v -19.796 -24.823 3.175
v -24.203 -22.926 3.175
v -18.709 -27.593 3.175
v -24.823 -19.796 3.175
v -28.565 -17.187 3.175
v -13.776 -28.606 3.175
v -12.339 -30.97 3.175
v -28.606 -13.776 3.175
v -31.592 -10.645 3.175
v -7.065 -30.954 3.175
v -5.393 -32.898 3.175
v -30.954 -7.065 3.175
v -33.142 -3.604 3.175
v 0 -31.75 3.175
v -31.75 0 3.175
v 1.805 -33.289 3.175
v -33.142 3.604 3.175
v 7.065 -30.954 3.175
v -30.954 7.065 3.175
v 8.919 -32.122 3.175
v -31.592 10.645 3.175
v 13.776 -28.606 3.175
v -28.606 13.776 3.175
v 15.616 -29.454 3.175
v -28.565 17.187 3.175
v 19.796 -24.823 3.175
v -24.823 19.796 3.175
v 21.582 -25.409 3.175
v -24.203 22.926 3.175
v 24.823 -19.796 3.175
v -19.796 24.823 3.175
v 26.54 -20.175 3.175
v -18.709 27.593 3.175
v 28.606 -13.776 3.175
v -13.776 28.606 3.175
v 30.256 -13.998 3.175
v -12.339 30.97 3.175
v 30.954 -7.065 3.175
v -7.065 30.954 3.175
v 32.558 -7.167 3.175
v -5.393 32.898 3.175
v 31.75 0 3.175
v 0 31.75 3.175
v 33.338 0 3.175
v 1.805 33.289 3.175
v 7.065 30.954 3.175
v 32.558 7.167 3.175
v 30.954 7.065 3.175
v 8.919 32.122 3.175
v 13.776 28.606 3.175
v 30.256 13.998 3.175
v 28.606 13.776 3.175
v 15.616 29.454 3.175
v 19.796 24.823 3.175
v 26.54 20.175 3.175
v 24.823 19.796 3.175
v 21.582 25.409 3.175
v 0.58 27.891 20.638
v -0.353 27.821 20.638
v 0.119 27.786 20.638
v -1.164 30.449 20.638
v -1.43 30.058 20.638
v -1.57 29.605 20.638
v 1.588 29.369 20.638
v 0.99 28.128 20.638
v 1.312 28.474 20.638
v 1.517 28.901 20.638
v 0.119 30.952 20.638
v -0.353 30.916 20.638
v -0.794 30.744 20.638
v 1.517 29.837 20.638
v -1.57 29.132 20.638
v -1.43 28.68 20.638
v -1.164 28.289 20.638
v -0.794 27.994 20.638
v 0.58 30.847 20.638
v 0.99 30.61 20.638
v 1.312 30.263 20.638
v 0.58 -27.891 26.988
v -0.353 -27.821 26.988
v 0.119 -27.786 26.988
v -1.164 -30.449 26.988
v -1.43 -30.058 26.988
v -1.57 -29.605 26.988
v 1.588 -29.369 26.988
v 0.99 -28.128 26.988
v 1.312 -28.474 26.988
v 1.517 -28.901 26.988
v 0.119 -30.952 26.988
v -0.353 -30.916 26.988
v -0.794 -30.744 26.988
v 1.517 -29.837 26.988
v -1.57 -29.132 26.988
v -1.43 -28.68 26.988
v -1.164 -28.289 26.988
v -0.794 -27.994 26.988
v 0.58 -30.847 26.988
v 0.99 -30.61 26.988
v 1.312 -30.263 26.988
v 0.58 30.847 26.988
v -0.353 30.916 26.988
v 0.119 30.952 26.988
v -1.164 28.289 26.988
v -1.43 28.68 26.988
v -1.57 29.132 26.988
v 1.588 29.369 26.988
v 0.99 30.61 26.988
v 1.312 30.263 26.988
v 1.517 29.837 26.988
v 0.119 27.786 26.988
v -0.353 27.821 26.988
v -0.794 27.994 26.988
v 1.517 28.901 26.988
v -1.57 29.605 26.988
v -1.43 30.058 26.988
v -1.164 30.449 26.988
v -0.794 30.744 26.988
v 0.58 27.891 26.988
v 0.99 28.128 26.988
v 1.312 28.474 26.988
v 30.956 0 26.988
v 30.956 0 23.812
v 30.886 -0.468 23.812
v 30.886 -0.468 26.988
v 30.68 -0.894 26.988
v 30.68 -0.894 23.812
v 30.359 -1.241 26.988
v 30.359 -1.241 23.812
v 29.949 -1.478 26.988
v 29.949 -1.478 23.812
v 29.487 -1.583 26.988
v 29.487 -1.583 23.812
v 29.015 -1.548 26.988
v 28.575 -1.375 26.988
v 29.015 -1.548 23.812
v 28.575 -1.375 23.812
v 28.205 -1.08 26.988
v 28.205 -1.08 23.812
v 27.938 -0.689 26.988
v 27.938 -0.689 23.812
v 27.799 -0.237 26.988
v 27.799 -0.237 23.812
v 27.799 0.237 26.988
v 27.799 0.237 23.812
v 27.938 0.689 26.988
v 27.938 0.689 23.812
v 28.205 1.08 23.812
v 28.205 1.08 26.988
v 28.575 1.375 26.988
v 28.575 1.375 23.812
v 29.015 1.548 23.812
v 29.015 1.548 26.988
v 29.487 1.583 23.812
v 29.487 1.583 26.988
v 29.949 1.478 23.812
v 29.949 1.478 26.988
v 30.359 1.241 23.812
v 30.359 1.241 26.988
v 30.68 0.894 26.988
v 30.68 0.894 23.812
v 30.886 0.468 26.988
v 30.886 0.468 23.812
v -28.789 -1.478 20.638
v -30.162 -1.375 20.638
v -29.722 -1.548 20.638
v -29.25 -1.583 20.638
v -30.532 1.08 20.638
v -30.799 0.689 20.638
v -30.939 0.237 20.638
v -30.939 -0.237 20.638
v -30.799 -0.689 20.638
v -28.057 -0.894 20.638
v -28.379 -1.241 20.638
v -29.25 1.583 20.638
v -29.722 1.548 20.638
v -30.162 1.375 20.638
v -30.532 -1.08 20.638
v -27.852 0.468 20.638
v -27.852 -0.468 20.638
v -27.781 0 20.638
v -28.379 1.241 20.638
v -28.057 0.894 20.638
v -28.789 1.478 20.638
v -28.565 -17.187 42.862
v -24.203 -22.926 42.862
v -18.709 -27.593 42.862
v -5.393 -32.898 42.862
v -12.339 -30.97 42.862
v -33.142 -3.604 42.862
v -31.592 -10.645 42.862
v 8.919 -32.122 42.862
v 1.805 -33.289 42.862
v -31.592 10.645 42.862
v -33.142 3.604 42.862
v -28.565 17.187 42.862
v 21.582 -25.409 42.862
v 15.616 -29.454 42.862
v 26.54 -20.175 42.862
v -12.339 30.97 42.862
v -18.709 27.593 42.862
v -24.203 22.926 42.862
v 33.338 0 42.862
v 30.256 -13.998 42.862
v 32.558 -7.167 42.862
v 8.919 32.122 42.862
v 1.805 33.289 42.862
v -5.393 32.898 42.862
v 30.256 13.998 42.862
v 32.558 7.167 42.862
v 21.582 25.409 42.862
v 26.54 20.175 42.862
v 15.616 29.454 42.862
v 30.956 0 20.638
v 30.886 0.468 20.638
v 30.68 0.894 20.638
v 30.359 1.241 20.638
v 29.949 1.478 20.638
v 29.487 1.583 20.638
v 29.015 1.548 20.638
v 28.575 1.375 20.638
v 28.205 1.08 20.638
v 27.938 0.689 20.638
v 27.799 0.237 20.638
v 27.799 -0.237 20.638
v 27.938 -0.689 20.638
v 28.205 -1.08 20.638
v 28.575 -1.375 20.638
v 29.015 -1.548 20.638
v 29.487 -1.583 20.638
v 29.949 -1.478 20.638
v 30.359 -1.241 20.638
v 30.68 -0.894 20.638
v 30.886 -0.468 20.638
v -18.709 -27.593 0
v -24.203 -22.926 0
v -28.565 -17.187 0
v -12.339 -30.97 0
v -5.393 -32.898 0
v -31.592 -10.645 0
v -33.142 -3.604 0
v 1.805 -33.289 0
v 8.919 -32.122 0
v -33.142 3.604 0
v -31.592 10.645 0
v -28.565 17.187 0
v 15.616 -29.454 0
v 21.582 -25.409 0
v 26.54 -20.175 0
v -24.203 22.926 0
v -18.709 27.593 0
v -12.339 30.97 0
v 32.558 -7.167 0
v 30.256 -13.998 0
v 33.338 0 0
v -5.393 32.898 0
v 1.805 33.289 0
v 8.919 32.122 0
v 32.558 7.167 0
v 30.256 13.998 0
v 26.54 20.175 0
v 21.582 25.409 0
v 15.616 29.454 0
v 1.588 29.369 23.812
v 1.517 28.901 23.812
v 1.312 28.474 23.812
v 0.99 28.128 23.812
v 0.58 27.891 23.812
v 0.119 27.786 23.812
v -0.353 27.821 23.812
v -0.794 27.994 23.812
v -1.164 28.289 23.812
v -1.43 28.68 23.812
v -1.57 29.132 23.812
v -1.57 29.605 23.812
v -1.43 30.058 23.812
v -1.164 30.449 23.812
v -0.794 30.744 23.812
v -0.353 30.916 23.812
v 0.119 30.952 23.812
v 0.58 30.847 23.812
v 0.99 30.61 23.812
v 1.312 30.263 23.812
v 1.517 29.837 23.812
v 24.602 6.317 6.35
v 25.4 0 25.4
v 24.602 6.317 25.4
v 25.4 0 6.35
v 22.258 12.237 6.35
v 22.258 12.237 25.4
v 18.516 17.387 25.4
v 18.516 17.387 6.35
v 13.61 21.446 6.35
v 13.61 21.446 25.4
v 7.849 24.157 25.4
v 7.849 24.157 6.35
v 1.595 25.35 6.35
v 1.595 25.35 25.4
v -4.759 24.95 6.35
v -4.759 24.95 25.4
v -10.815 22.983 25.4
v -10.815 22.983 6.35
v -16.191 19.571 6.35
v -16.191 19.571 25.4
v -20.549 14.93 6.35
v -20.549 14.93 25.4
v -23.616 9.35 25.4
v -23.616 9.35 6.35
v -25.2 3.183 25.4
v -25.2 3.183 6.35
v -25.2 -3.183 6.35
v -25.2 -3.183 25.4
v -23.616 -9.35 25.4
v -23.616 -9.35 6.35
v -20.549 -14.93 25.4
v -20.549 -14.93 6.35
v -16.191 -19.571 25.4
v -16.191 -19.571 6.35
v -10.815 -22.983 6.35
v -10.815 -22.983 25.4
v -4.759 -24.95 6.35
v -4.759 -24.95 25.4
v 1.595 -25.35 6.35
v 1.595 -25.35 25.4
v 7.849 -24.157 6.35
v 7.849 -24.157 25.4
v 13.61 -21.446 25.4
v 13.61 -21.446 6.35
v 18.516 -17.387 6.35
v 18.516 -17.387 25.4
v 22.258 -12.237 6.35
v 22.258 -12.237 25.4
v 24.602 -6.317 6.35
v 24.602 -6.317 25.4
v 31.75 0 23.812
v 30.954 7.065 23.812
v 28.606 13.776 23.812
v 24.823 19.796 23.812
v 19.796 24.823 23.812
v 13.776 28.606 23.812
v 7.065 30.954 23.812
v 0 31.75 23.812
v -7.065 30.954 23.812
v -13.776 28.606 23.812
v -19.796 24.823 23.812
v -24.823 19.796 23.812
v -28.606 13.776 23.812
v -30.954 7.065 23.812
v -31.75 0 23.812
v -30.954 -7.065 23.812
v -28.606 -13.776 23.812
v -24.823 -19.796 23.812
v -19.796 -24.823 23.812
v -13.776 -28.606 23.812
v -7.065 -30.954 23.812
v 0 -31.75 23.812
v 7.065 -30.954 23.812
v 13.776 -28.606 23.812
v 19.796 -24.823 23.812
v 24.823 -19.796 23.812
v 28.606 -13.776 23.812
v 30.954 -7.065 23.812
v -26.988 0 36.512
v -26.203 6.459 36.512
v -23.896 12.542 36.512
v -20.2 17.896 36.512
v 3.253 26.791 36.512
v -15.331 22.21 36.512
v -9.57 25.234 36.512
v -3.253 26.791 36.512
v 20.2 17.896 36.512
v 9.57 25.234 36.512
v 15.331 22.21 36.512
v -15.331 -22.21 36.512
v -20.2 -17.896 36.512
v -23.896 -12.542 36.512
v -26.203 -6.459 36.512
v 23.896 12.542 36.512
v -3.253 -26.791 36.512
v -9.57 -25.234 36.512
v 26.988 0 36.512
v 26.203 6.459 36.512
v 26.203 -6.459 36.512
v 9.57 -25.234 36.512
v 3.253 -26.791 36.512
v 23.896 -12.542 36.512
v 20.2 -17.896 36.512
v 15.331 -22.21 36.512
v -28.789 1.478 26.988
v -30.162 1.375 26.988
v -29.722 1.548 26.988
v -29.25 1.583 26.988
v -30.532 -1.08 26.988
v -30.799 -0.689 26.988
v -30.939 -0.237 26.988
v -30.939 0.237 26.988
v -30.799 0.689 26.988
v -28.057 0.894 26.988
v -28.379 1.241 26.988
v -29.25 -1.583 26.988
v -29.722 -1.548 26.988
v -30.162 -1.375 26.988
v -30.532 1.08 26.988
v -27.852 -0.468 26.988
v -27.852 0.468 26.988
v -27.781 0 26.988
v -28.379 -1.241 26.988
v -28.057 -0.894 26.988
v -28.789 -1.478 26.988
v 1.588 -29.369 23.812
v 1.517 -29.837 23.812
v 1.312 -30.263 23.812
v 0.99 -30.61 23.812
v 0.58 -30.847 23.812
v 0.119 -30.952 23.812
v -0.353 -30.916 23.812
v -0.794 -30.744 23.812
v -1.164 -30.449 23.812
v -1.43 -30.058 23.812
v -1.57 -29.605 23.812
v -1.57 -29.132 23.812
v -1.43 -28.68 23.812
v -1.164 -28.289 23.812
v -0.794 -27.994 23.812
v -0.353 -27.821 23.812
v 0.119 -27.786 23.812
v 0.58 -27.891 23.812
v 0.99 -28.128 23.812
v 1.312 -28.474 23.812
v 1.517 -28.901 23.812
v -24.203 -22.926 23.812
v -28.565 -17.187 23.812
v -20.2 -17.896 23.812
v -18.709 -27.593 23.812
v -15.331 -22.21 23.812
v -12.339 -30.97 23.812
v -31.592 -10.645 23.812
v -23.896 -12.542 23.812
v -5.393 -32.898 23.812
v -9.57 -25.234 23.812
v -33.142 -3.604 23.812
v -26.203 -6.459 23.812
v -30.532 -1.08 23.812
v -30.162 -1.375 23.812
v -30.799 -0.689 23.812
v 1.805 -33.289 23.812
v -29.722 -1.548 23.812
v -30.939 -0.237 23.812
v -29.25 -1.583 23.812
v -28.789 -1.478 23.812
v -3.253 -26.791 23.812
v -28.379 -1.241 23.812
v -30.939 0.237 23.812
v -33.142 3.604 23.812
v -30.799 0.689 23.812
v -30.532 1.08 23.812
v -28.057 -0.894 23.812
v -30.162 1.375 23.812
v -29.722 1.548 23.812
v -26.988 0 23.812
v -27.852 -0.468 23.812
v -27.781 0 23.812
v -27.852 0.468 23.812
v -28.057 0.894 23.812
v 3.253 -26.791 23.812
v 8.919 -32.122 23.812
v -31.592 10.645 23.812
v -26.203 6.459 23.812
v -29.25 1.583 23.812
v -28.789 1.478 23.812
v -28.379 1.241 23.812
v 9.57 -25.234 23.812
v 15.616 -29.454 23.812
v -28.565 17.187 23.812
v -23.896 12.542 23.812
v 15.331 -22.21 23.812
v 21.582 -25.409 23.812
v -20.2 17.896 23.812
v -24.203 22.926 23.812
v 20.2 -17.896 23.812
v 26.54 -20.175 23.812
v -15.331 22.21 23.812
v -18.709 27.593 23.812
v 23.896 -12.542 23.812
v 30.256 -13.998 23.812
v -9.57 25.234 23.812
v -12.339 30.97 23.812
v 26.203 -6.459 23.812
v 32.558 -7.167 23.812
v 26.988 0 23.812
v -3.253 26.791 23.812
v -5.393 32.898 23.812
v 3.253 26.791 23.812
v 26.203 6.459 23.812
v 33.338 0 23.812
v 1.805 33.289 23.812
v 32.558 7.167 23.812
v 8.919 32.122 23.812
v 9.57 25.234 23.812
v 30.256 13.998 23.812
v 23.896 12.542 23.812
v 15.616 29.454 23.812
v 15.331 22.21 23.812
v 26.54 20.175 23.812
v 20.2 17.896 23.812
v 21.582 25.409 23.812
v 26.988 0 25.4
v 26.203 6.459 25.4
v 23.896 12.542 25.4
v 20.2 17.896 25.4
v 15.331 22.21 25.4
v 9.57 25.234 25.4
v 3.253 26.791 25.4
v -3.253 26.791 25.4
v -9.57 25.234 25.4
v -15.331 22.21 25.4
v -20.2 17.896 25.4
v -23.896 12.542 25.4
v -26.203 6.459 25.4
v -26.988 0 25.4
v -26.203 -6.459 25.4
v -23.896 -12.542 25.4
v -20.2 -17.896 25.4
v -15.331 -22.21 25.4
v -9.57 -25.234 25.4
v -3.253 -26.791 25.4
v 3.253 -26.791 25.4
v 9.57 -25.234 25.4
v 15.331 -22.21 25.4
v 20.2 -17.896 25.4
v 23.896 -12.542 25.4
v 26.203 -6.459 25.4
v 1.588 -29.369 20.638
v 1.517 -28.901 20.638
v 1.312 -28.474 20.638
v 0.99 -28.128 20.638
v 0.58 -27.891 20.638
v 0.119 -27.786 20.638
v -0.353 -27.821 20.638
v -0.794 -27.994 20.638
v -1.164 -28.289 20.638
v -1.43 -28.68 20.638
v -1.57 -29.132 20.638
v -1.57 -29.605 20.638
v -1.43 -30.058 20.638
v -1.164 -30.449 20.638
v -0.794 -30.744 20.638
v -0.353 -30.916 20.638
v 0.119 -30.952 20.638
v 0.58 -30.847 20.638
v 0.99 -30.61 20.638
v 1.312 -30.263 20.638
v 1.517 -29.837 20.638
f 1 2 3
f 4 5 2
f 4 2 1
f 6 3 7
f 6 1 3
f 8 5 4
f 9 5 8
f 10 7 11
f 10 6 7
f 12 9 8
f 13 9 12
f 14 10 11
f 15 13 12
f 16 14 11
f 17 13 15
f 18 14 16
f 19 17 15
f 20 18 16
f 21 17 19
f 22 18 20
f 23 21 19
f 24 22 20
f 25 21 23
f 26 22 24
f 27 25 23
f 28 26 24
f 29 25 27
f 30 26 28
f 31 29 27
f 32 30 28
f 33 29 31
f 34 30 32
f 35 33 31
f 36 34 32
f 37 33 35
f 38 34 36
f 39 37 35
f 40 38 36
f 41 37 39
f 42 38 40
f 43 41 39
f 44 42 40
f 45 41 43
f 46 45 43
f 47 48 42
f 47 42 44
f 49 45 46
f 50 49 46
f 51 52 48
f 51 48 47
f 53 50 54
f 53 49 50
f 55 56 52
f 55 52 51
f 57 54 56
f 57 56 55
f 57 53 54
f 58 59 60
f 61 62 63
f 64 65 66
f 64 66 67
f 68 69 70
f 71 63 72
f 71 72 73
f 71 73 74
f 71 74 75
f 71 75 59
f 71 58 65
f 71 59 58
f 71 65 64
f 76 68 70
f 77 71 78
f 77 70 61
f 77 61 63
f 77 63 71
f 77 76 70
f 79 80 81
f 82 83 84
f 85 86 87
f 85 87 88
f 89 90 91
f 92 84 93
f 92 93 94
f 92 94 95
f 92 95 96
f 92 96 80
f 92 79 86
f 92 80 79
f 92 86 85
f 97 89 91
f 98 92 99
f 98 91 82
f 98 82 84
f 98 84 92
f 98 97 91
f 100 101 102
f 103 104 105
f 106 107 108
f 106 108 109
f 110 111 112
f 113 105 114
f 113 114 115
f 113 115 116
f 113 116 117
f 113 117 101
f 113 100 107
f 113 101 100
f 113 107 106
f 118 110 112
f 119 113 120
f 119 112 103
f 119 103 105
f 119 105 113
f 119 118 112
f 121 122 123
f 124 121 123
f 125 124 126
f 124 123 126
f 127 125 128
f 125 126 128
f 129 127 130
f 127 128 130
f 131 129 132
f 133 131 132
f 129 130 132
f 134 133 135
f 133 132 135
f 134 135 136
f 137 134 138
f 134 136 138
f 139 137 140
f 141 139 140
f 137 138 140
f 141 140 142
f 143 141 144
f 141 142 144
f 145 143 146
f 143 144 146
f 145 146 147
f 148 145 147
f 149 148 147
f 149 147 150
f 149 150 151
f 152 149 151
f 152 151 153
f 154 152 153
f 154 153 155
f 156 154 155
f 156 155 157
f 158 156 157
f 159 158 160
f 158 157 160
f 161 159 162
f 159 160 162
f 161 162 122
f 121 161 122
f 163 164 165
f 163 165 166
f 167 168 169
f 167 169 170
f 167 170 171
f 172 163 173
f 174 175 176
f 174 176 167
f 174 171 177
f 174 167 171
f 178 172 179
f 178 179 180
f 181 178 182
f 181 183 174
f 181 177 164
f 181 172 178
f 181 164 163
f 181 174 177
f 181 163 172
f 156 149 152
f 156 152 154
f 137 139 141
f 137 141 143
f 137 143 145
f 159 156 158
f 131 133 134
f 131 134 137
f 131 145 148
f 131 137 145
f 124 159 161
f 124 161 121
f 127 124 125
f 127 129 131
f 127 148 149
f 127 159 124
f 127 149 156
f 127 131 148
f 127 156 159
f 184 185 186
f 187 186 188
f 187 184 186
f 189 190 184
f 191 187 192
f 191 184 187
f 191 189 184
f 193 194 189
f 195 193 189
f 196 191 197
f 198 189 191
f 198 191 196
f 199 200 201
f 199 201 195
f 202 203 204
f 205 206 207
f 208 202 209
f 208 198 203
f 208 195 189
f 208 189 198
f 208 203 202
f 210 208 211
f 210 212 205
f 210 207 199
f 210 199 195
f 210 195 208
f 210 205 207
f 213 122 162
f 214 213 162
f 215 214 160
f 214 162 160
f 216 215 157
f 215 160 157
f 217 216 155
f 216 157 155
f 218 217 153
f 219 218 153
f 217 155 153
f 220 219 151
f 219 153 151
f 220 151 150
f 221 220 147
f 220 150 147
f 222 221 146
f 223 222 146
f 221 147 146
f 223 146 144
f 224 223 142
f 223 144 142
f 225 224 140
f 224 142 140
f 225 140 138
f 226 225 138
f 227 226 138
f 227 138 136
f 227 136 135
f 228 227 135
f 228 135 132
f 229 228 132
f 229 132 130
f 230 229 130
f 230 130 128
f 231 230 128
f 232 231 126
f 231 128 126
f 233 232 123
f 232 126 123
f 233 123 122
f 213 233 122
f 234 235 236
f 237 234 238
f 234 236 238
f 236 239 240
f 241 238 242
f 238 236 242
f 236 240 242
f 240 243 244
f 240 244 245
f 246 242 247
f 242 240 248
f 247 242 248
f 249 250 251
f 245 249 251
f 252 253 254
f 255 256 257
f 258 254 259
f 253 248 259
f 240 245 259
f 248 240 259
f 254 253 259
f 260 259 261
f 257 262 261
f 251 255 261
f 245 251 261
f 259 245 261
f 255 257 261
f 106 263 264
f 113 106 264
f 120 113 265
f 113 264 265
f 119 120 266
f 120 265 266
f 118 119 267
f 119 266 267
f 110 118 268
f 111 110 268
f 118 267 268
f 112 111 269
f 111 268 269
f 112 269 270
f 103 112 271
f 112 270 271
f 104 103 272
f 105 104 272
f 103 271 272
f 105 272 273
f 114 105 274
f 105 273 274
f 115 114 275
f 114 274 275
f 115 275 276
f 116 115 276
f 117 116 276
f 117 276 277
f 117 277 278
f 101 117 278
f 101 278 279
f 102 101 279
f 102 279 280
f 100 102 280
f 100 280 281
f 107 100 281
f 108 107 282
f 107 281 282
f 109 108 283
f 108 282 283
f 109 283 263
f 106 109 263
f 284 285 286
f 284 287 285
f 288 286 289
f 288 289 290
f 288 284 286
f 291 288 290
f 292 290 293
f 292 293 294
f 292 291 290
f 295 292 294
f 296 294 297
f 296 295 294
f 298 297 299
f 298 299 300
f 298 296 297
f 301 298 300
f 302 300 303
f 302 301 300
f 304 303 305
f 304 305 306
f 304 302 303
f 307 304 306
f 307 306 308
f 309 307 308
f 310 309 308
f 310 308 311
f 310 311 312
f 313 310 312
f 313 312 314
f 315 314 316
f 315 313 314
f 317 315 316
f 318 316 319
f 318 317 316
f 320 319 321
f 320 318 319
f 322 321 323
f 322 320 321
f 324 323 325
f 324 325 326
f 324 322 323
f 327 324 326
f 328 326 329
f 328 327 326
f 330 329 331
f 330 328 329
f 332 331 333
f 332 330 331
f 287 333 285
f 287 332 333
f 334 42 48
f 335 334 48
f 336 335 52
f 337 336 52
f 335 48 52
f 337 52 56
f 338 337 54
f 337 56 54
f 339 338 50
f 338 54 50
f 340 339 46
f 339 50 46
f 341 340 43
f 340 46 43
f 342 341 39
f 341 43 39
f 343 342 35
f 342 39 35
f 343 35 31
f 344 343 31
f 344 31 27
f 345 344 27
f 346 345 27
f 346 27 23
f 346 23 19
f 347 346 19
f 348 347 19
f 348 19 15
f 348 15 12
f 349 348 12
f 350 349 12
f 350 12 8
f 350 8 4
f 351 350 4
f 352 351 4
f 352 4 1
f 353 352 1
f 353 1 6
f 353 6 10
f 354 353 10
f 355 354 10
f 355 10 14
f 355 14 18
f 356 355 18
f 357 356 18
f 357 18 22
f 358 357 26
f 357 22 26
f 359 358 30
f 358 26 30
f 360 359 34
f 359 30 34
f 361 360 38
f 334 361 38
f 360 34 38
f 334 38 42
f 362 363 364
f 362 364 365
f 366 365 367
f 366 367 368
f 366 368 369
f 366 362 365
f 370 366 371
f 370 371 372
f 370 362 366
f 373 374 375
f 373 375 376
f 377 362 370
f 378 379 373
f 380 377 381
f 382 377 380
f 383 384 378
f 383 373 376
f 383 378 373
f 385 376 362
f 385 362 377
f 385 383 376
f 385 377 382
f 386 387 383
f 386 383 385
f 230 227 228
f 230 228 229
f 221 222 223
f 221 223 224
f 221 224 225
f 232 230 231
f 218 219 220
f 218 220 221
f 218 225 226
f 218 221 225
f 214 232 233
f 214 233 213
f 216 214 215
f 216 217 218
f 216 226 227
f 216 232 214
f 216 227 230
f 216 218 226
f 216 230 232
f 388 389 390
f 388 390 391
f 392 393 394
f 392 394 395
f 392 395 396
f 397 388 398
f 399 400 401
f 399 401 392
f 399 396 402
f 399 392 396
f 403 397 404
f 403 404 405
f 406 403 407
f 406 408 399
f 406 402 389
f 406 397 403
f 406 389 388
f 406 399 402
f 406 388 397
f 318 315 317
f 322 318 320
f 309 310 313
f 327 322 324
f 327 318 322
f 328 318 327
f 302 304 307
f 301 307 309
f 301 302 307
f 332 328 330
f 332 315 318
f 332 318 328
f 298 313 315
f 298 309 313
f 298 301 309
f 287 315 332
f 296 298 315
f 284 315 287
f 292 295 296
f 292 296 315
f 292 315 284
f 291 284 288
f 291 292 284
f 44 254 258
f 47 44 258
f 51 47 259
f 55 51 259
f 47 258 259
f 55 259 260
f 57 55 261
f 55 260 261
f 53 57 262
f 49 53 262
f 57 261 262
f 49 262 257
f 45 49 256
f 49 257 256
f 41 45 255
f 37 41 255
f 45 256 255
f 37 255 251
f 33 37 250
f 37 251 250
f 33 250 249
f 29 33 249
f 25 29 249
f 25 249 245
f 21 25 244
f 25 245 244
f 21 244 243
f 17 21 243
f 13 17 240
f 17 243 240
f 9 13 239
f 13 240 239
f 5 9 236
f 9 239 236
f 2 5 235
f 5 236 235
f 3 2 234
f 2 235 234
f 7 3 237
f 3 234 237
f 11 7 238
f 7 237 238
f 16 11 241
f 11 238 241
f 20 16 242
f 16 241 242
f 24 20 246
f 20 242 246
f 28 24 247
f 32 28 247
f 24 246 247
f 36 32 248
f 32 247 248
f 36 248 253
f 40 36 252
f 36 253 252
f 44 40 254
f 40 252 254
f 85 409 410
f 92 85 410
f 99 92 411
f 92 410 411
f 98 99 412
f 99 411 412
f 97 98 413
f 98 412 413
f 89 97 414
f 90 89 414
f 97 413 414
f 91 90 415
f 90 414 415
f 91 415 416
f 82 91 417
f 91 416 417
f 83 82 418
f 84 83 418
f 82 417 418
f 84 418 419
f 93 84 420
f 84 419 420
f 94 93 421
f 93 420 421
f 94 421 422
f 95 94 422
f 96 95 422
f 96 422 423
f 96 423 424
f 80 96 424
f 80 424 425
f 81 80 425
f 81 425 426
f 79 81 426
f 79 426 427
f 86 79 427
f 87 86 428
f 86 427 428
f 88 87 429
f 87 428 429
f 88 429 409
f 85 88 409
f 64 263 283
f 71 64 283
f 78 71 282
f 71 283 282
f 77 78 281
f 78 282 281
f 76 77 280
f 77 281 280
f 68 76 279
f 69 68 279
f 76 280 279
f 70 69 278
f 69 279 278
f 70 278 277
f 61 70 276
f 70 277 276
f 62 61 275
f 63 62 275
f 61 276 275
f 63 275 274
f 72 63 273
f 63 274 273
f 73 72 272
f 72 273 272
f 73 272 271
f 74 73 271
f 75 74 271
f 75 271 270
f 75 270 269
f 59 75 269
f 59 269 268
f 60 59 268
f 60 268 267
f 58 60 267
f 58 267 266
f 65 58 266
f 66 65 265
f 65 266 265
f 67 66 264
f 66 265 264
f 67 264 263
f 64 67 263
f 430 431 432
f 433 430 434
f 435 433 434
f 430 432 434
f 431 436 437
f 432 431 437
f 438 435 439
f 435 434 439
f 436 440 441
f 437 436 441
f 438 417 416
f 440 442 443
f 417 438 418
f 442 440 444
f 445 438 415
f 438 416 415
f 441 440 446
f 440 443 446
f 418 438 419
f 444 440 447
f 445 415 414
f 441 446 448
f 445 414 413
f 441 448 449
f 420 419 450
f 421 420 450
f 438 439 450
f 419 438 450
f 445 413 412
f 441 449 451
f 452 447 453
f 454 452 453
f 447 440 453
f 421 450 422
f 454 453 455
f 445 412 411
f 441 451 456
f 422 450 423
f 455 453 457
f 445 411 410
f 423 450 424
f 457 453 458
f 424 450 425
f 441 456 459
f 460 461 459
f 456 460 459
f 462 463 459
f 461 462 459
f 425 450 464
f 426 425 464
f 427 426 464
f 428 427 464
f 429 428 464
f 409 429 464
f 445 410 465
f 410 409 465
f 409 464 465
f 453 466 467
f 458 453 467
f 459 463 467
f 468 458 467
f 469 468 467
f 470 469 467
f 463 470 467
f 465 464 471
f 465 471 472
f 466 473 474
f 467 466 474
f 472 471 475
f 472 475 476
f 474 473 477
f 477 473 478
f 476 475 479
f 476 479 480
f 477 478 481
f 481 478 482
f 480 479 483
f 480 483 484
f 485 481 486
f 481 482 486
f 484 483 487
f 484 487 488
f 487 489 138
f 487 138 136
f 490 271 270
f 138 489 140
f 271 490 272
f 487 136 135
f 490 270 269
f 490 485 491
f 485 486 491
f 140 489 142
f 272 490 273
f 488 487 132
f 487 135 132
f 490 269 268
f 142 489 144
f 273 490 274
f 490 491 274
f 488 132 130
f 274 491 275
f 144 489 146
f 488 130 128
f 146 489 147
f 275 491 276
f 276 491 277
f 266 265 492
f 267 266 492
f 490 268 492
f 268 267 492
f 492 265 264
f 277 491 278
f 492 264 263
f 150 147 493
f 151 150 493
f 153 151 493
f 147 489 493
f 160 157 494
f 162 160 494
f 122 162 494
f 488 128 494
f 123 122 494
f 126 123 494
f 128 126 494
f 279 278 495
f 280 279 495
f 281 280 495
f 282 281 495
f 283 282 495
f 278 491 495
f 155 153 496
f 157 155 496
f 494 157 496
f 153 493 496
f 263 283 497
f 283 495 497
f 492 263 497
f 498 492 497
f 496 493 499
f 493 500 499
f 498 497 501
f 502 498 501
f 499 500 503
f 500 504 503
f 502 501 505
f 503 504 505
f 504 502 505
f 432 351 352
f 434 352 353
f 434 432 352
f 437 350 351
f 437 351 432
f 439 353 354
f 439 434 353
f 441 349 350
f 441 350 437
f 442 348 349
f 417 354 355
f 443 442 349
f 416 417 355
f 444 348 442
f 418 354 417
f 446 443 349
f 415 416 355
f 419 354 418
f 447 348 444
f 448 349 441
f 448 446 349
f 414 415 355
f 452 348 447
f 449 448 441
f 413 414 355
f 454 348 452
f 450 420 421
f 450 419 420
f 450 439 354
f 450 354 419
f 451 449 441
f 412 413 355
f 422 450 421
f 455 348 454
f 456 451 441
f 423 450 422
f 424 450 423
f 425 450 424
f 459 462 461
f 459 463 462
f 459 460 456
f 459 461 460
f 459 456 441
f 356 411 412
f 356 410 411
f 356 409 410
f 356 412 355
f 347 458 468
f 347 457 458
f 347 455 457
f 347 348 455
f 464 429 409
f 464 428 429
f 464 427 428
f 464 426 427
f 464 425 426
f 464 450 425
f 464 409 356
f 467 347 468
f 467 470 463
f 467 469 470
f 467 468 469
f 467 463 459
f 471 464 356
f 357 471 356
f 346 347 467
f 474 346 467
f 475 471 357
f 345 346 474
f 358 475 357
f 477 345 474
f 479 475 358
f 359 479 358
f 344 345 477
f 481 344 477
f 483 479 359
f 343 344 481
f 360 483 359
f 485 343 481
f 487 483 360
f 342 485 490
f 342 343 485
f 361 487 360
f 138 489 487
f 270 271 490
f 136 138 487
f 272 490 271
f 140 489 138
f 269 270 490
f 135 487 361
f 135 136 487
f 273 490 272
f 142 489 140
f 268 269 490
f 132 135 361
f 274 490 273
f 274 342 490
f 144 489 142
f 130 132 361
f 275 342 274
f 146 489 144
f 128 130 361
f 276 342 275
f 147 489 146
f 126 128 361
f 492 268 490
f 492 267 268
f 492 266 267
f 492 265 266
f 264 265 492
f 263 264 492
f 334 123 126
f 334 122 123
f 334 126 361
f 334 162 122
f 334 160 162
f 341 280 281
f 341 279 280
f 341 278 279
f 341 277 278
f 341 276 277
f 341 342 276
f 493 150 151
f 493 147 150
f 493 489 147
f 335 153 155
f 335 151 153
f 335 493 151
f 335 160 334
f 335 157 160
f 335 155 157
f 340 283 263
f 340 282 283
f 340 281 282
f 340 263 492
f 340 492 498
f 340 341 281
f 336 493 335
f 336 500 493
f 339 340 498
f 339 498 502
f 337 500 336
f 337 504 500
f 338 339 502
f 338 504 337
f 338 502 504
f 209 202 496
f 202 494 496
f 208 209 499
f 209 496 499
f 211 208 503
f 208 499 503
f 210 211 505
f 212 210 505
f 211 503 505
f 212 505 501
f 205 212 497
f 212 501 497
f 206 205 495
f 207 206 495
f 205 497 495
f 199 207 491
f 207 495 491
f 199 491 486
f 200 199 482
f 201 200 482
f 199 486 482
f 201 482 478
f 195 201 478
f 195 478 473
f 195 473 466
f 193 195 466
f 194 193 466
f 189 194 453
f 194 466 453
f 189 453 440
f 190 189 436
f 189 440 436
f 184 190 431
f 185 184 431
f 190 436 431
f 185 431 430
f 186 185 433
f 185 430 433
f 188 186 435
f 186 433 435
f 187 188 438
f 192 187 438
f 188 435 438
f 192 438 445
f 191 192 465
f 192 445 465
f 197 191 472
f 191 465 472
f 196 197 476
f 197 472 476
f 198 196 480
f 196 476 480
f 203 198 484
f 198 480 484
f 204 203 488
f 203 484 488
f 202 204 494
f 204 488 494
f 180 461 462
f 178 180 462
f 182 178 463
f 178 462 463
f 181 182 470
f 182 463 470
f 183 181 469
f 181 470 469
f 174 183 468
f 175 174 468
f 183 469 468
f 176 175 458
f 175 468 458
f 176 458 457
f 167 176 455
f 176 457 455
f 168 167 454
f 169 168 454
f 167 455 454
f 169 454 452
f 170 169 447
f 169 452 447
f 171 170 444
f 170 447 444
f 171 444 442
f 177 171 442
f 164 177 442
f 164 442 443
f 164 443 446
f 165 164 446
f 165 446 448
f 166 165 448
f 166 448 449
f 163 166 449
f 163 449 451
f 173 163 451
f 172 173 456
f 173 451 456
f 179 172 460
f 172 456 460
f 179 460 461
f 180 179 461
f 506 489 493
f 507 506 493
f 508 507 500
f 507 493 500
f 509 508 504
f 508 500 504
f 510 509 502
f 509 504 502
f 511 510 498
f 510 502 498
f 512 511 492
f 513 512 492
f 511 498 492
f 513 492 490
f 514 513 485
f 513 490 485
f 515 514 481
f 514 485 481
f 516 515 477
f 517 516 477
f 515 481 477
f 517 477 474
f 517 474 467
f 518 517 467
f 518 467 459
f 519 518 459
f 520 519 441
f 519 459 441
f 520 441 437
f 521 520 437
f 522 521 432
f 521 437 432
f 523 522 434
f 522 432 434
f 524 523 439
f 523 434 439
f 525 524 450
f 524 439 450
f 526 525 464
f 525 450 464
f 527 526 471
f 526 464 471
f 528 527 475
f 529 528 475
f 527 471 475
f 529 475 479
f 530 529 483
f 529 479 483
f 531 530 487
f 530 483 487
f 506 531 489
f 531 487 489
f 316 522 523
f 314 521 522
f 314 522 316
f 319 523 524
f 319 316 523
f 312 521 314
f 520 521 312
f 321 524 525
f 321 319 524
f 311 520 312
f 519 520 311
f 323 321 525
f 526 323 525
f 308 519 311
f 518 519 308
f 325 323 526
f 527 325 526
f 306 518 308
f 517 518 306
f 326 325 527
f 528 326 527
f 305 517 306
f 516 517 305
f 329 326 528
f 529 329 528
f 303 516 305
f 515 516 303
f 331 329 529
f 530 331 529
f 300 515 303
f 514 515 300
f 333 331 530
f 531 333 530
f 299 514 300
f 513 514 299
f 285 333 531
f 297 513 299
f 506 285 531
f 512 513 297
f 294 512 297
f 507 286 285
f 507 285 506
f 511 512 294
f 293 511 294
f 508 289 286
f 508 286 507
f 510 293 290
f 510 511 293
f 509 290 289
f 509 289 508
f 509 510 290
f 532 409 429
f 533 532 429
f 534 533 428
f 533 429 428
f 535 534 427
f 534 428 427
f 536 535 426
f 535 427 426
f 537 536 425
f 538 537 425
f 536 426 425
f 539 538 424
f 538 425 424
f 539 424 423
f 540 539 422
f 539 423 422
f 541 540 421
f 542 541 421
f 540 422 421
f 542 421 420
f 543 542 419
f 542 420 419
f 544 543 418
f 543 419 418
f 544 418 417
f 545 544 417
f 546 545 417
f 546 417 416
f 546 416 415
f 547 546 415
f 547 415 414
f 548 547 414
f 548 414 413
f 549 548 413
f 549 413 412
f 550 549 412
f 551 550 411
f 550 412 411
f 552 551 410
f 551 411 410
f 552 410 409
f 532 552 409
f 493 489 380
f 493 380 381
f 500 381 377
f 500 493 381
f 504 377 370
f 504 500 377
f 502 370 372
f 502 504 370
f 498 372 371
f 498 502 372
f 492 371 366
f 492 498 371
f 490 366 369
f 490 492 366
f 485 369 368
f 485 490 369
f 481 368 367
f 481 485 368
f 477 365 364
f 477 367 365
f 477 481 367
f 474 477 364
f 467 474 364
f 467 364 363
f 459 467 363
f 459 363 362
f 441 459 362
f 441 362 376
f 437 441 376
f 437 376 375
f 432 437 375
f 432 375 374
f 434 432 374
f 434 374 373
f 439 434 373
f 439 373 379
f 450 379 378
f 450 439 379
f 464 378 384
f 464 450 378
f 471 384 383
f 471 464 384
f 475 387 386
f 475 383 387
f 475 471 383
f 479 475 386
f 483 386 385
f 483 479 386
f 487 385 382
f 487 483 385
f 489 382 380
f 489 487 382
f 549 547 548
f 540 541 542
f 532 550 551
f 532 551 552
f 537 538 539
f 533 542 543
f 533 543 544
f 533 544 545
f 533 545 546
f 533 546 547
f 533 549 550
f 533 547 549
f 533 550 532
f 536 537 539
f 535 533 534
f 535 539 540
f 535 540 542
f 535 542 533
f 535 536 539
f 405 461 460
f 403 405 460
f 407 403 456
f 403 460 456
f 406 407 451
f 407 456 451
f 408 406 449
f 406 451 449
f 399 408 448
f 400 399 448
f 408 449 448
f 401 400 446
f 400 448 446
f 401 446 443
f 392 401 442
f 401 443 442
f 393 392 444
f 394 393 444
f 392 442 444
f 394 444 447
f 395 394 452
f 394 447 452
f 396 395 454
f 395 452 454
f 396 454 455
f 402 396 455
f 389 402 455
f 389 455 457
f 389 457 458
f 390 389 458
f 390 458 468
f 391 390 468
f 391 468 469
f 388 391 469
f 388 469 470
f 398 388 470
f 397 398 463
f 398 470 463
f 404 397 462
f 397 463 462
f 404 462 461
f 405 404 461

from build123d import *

# Parameters (mm, degrees)
F0_R       = 25.4
F1_DEPTH   = 6.35
F0_R_2     = 31.75
F2_DEPTH   = 23.8125
F0_R_3     = 33.3375
F3_DEPTH   = 3.175
F4_R       = 26.9875
F4_R_2     = 25.4
F5_DEPTH   = 1.5875
F7_R       = 33.3375
F7_R_2     = 26.9875
F8_DEPTH   = 9.525
F9_R       = 33.3375
F10_DEPTH  = 9.525
F11_R      = 1.5875
F12_DEPTH  = 3.175
F6_R       = 1.5875
F13_DEPTH  = 3.175
F10_FACE_R = 26.9875
F14_DEPTH  = 3.175


with BuildPart() as f1:
    # F0 (on Top) → F1 (new body)
    with BuildSketch(Plane.XY):
        Circle(F0_R)
    extrude(amount=F1_DEPTH)

    # F0 (on Top) → F2 (join)
    with BuildSketch(Plane.XY):
        Circle(F0_R_2)
        Circle(F0_R, mode=Mode.SUBTRACT)
    extrude(amount=F2_DEPTH)

    # F0 (on Top) → F3 (join)
    with BuildSketch(Plane.XY):
        Circle(F0_R_3)
        Circle(F0_R_2, mode=Mode.SUBTRACT)
    extrude(amount=F3_DEPTH)

    # F4 (on face) → F5 (join)
    with BuildSketch(Plane.XY.offset(23.8125)):
        Circle(F4_R)
        Circle(F4_R_2, mode=Mode.SUBTRACT)
    extrude(amount=F5_DEPTH)

    # F6 (on face) → F13 (cut)
    with BuildSketch(Plane.XY.offset(23.8125)):
        with Locations((29.36875, 0)):
            Circle(F6_R)
        with Locations((-29.36875, 0)):
            Circle(F6_R)
        with Locations((0, 29.36875)):
            Circle(F6_R)
        with Locations((0, -29.36875)):
            Circle(F6_R)
    extrude(amount=-F13_DEPTH, mode=Mode.SUBTRACT)


with BuildPart() as f8:
    # F7 (on face) → F8 (new body)
    with BuildSketch(Plane.XY.offset(23.8125)):
        Circle(F7_R)
        Circle(F7_R_2, mode=Mode.SUBTRACT)
    extrude(amount=F8_DEPTH)

    # F9 (on face) → F10 (join)
    with BuildSketch(Plane.XY.offset(33.3375)):
        Circle(F9_R)
    extrude(amount=F10_DEPTH)

    # F11 (on face) → F12 (cut)
    with BuildSketch(Plane(origin=(0, 0, 23.8125), x_dir=(1, 0, 0), z_dir=(0, 0, -1))):
        with Locations((29.36875, 0)):
            Circle(F11_R)
        with Locations((0, -29.36875)):
            Circle(F11_R)
        with Locations((-29.36875, 0)):
            Circle(F11_R)
        with Locations((0, 29.36875)):
            Circle(F11_R)
    extrude(amount=-F12_DEPTH, mode=Mode.SUBTRACT)

    # F10_face (on face) → F14 (cut)
    with BuildSketch(Plane(origin=(0, 0, 33.3375), x_dir=(1, 0, 0), z_dir=(0, 0, -1))):
        Circle(F10_FACE_R)
    extrude(amount=-F14_DEPTH, mode=Mode.SUBTRACT)


solid = Compound([f1.part, f8.part])
